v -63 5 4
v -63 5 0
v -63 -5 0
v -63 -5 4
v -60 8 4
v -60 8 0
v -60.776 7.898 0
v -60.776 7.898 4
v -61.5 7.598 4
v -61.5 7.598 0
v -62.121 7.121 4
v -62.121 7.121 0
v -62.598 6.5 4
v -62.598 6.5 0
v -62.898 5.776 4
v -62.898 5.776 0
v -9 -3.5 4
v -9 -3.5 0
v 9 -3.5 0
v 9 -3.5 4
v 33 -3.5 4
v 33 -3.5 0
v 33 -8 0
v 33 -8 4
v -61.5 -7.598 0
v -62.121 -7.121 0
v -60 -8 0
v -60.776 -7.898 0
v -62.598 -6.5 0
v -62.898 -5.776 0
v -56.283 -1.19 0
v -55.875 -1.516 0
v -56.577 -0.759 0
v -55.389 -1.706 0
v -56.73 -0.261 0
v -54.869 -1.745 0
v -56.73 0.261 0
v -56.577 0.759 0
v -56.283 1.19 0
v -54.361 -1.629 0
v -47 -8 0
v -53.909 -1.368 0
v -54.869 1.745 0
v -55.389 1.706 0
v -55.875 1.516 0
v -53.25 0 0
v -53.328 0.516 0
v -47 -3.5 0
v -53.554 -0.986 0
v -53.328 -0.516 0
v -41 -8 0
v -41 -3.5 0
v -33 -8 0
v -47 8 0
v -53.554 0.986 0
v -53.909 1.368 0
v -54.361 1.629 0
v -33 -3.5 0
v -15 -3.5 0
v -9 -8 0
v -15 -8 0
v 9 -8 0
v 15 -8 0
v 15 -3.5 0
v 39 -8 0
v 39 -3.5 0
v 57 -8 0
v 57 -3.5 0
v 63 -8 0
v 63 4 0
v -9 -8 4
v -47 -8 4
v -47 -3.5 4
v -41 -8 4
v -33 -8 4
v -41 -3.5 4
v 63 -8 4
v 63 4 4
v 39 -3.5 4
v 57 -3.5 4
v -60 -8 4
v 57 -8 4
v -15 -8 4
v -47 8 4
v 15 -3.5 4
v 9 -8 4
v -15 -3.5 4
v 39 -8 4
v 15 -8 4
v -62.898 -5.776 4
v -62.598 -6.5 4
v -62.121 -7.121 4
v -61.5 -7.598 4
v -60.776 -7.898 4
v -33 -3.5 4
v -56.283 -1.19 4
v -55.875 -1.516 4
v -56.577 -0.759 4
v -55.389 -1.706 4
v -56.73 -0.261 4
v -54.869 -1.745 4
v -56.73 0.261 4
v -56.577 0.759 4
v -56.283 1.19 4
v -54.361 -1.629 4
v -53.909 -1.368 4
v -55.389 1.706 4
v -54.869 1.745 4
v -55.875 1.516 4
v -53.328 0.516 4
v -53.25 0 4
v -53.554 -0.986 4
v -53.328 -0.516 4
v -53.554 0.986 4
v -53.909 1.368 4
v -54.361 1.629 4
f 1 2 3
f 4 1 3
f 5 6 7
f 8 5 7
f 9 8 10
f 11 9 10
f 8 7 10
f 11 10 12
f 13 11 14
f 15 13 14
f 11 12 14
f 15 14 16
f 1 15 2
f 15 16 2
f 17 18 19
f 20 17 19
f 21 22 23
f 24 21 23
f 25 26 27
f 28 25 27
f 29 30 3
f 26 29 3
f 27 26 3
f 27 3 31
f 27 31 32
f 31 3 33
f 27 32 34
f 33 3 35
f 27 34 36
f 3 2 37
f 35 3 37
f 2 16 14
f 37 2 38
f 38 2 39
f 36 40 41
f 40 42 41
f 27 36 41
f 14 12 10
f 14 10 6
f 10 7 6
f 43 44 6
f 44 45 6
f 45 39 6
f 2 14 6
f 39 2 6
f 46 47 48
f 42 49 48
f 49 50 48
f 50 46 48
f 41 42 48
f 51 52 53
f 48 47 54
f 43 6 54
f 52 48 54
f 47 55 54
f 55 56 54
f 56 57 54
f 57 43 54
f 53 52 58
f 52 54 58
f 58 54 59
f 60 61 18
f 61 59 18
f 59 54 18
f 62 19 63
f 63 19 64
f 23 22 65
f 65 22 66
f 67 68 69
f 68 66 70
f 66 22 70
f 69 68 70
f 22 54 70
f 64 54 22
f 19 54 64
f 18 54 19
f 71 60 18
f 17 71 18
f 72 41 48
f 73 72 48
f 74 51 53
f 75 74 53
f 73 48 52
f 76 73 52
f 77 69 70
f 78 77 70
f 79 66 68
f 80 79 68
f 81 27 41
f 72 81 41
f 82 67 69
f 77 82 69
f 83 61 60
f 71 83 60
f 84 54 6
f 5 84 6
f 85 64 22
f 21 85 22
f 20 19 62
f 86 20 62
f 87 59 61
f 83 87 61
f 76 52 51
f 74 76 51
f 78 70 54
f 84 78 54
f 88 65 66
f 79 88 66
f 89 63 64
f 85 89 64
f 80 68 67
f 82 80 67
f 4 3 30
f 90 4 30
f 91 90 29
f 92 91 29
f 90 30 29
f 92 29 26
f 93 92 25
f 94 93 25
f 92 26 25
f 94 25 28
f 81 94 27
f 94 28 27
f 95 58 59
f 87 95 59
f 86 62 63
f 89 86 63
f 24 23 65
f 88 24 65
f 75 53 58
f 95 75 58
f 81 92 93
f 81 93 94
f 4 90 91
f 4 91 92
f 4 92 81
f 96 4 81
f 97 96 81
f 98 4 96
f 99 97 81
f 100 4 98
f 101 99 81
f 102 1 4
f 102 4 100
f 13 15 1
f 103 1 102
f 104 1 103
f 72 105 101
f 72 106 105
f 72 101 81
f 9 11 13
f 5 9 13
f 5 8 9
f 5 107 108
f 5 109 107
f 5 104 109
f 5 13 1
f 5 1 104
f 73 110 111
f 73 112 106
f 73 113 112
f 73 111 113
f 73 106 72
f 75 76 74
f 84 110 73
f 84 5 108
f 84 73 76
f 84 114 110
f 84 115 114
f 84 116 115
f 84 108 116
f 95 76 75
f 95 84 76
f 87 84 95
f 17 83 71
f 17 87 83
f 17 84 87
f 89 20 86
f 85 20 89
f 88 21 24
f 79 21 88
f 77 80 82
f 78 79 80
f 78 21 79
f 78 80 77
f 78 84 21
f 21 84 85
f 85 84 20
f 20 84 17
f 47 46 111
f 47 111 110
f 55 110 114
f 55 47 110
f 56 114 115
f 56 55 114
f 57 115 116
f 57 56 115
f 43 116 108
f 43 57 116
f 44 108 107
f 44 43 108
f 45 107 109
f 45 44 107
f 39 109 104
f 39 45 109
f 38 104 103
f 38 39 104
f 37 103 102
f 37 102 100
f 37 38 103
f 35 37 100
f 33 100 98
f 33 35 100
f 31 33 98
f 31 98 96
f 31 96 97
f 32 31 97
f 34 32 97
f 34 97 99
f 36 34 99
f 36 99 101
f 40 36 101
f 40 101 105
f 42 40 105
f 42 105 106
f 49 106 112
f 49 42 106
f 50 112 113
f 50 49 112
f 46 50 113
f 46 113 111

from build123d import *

# Parameters (mm, degrees)
F0_R     = 1.75
F1_DEPTH = 4


with BuildPart() as f1:
    # F0 (on Top) → F1 (new body)
    with BuildSketch(Plane.XY):
        with BuildLine():
            Line((-15, -8), (-9, -8))
            Line((-9, -8), (-9, -3.5))
            Line((-9, -3.5), (9, -3.5))
            Line((9, -3.5), (9, -8))
            Line((9, -8), (15, -8))
            Line((15, -8), (15, -3.5))
            Line((15, -3.5), (33, -3.5))
            Line((33, -3.5), (33, -8))
            Line((33, -8), (39, -8))
            Line((39, -8), (39, -3.5))
            Line((39, -3.5), (57, -3.5))
            Line((57, -3.5), (57, -8))
            Line((57, -8), (63, -8))
            Line((63, -8), (63, 4))
            Line((63, 4), (-47, 8))
            Line((-47, 8), (-60, 8))
            ThreePointArc((-60, 8), (-62.12132, 7.12132), (-63, 5))
            Line((-63, 5), (-63, -5))
            ThreePointArc((-63, -5), (-62.12132, -7.12132), (-60, -8))
            Line((-60, -8), (-47, -8))
            Line((-47, -8), (-47, -3.5))
            Line((-47, -3.5), (-41, -3.5))
            Line((-41, -3.5), (-41, -8))
            Line((-41, -8), (-33, -8))
            Line((-33, -8), (-33, -3.5))
            Line((-33, -3.5), (-15, -3.5))
            Line((-15, -3.5), (-15, -8))
        make_face()
        with Locations((-55, 0)):
            Circle(F0_R, mode=Mode.SUBTRACT)
    extrude(amount=F1_DEPTH)


solid = f1.part
